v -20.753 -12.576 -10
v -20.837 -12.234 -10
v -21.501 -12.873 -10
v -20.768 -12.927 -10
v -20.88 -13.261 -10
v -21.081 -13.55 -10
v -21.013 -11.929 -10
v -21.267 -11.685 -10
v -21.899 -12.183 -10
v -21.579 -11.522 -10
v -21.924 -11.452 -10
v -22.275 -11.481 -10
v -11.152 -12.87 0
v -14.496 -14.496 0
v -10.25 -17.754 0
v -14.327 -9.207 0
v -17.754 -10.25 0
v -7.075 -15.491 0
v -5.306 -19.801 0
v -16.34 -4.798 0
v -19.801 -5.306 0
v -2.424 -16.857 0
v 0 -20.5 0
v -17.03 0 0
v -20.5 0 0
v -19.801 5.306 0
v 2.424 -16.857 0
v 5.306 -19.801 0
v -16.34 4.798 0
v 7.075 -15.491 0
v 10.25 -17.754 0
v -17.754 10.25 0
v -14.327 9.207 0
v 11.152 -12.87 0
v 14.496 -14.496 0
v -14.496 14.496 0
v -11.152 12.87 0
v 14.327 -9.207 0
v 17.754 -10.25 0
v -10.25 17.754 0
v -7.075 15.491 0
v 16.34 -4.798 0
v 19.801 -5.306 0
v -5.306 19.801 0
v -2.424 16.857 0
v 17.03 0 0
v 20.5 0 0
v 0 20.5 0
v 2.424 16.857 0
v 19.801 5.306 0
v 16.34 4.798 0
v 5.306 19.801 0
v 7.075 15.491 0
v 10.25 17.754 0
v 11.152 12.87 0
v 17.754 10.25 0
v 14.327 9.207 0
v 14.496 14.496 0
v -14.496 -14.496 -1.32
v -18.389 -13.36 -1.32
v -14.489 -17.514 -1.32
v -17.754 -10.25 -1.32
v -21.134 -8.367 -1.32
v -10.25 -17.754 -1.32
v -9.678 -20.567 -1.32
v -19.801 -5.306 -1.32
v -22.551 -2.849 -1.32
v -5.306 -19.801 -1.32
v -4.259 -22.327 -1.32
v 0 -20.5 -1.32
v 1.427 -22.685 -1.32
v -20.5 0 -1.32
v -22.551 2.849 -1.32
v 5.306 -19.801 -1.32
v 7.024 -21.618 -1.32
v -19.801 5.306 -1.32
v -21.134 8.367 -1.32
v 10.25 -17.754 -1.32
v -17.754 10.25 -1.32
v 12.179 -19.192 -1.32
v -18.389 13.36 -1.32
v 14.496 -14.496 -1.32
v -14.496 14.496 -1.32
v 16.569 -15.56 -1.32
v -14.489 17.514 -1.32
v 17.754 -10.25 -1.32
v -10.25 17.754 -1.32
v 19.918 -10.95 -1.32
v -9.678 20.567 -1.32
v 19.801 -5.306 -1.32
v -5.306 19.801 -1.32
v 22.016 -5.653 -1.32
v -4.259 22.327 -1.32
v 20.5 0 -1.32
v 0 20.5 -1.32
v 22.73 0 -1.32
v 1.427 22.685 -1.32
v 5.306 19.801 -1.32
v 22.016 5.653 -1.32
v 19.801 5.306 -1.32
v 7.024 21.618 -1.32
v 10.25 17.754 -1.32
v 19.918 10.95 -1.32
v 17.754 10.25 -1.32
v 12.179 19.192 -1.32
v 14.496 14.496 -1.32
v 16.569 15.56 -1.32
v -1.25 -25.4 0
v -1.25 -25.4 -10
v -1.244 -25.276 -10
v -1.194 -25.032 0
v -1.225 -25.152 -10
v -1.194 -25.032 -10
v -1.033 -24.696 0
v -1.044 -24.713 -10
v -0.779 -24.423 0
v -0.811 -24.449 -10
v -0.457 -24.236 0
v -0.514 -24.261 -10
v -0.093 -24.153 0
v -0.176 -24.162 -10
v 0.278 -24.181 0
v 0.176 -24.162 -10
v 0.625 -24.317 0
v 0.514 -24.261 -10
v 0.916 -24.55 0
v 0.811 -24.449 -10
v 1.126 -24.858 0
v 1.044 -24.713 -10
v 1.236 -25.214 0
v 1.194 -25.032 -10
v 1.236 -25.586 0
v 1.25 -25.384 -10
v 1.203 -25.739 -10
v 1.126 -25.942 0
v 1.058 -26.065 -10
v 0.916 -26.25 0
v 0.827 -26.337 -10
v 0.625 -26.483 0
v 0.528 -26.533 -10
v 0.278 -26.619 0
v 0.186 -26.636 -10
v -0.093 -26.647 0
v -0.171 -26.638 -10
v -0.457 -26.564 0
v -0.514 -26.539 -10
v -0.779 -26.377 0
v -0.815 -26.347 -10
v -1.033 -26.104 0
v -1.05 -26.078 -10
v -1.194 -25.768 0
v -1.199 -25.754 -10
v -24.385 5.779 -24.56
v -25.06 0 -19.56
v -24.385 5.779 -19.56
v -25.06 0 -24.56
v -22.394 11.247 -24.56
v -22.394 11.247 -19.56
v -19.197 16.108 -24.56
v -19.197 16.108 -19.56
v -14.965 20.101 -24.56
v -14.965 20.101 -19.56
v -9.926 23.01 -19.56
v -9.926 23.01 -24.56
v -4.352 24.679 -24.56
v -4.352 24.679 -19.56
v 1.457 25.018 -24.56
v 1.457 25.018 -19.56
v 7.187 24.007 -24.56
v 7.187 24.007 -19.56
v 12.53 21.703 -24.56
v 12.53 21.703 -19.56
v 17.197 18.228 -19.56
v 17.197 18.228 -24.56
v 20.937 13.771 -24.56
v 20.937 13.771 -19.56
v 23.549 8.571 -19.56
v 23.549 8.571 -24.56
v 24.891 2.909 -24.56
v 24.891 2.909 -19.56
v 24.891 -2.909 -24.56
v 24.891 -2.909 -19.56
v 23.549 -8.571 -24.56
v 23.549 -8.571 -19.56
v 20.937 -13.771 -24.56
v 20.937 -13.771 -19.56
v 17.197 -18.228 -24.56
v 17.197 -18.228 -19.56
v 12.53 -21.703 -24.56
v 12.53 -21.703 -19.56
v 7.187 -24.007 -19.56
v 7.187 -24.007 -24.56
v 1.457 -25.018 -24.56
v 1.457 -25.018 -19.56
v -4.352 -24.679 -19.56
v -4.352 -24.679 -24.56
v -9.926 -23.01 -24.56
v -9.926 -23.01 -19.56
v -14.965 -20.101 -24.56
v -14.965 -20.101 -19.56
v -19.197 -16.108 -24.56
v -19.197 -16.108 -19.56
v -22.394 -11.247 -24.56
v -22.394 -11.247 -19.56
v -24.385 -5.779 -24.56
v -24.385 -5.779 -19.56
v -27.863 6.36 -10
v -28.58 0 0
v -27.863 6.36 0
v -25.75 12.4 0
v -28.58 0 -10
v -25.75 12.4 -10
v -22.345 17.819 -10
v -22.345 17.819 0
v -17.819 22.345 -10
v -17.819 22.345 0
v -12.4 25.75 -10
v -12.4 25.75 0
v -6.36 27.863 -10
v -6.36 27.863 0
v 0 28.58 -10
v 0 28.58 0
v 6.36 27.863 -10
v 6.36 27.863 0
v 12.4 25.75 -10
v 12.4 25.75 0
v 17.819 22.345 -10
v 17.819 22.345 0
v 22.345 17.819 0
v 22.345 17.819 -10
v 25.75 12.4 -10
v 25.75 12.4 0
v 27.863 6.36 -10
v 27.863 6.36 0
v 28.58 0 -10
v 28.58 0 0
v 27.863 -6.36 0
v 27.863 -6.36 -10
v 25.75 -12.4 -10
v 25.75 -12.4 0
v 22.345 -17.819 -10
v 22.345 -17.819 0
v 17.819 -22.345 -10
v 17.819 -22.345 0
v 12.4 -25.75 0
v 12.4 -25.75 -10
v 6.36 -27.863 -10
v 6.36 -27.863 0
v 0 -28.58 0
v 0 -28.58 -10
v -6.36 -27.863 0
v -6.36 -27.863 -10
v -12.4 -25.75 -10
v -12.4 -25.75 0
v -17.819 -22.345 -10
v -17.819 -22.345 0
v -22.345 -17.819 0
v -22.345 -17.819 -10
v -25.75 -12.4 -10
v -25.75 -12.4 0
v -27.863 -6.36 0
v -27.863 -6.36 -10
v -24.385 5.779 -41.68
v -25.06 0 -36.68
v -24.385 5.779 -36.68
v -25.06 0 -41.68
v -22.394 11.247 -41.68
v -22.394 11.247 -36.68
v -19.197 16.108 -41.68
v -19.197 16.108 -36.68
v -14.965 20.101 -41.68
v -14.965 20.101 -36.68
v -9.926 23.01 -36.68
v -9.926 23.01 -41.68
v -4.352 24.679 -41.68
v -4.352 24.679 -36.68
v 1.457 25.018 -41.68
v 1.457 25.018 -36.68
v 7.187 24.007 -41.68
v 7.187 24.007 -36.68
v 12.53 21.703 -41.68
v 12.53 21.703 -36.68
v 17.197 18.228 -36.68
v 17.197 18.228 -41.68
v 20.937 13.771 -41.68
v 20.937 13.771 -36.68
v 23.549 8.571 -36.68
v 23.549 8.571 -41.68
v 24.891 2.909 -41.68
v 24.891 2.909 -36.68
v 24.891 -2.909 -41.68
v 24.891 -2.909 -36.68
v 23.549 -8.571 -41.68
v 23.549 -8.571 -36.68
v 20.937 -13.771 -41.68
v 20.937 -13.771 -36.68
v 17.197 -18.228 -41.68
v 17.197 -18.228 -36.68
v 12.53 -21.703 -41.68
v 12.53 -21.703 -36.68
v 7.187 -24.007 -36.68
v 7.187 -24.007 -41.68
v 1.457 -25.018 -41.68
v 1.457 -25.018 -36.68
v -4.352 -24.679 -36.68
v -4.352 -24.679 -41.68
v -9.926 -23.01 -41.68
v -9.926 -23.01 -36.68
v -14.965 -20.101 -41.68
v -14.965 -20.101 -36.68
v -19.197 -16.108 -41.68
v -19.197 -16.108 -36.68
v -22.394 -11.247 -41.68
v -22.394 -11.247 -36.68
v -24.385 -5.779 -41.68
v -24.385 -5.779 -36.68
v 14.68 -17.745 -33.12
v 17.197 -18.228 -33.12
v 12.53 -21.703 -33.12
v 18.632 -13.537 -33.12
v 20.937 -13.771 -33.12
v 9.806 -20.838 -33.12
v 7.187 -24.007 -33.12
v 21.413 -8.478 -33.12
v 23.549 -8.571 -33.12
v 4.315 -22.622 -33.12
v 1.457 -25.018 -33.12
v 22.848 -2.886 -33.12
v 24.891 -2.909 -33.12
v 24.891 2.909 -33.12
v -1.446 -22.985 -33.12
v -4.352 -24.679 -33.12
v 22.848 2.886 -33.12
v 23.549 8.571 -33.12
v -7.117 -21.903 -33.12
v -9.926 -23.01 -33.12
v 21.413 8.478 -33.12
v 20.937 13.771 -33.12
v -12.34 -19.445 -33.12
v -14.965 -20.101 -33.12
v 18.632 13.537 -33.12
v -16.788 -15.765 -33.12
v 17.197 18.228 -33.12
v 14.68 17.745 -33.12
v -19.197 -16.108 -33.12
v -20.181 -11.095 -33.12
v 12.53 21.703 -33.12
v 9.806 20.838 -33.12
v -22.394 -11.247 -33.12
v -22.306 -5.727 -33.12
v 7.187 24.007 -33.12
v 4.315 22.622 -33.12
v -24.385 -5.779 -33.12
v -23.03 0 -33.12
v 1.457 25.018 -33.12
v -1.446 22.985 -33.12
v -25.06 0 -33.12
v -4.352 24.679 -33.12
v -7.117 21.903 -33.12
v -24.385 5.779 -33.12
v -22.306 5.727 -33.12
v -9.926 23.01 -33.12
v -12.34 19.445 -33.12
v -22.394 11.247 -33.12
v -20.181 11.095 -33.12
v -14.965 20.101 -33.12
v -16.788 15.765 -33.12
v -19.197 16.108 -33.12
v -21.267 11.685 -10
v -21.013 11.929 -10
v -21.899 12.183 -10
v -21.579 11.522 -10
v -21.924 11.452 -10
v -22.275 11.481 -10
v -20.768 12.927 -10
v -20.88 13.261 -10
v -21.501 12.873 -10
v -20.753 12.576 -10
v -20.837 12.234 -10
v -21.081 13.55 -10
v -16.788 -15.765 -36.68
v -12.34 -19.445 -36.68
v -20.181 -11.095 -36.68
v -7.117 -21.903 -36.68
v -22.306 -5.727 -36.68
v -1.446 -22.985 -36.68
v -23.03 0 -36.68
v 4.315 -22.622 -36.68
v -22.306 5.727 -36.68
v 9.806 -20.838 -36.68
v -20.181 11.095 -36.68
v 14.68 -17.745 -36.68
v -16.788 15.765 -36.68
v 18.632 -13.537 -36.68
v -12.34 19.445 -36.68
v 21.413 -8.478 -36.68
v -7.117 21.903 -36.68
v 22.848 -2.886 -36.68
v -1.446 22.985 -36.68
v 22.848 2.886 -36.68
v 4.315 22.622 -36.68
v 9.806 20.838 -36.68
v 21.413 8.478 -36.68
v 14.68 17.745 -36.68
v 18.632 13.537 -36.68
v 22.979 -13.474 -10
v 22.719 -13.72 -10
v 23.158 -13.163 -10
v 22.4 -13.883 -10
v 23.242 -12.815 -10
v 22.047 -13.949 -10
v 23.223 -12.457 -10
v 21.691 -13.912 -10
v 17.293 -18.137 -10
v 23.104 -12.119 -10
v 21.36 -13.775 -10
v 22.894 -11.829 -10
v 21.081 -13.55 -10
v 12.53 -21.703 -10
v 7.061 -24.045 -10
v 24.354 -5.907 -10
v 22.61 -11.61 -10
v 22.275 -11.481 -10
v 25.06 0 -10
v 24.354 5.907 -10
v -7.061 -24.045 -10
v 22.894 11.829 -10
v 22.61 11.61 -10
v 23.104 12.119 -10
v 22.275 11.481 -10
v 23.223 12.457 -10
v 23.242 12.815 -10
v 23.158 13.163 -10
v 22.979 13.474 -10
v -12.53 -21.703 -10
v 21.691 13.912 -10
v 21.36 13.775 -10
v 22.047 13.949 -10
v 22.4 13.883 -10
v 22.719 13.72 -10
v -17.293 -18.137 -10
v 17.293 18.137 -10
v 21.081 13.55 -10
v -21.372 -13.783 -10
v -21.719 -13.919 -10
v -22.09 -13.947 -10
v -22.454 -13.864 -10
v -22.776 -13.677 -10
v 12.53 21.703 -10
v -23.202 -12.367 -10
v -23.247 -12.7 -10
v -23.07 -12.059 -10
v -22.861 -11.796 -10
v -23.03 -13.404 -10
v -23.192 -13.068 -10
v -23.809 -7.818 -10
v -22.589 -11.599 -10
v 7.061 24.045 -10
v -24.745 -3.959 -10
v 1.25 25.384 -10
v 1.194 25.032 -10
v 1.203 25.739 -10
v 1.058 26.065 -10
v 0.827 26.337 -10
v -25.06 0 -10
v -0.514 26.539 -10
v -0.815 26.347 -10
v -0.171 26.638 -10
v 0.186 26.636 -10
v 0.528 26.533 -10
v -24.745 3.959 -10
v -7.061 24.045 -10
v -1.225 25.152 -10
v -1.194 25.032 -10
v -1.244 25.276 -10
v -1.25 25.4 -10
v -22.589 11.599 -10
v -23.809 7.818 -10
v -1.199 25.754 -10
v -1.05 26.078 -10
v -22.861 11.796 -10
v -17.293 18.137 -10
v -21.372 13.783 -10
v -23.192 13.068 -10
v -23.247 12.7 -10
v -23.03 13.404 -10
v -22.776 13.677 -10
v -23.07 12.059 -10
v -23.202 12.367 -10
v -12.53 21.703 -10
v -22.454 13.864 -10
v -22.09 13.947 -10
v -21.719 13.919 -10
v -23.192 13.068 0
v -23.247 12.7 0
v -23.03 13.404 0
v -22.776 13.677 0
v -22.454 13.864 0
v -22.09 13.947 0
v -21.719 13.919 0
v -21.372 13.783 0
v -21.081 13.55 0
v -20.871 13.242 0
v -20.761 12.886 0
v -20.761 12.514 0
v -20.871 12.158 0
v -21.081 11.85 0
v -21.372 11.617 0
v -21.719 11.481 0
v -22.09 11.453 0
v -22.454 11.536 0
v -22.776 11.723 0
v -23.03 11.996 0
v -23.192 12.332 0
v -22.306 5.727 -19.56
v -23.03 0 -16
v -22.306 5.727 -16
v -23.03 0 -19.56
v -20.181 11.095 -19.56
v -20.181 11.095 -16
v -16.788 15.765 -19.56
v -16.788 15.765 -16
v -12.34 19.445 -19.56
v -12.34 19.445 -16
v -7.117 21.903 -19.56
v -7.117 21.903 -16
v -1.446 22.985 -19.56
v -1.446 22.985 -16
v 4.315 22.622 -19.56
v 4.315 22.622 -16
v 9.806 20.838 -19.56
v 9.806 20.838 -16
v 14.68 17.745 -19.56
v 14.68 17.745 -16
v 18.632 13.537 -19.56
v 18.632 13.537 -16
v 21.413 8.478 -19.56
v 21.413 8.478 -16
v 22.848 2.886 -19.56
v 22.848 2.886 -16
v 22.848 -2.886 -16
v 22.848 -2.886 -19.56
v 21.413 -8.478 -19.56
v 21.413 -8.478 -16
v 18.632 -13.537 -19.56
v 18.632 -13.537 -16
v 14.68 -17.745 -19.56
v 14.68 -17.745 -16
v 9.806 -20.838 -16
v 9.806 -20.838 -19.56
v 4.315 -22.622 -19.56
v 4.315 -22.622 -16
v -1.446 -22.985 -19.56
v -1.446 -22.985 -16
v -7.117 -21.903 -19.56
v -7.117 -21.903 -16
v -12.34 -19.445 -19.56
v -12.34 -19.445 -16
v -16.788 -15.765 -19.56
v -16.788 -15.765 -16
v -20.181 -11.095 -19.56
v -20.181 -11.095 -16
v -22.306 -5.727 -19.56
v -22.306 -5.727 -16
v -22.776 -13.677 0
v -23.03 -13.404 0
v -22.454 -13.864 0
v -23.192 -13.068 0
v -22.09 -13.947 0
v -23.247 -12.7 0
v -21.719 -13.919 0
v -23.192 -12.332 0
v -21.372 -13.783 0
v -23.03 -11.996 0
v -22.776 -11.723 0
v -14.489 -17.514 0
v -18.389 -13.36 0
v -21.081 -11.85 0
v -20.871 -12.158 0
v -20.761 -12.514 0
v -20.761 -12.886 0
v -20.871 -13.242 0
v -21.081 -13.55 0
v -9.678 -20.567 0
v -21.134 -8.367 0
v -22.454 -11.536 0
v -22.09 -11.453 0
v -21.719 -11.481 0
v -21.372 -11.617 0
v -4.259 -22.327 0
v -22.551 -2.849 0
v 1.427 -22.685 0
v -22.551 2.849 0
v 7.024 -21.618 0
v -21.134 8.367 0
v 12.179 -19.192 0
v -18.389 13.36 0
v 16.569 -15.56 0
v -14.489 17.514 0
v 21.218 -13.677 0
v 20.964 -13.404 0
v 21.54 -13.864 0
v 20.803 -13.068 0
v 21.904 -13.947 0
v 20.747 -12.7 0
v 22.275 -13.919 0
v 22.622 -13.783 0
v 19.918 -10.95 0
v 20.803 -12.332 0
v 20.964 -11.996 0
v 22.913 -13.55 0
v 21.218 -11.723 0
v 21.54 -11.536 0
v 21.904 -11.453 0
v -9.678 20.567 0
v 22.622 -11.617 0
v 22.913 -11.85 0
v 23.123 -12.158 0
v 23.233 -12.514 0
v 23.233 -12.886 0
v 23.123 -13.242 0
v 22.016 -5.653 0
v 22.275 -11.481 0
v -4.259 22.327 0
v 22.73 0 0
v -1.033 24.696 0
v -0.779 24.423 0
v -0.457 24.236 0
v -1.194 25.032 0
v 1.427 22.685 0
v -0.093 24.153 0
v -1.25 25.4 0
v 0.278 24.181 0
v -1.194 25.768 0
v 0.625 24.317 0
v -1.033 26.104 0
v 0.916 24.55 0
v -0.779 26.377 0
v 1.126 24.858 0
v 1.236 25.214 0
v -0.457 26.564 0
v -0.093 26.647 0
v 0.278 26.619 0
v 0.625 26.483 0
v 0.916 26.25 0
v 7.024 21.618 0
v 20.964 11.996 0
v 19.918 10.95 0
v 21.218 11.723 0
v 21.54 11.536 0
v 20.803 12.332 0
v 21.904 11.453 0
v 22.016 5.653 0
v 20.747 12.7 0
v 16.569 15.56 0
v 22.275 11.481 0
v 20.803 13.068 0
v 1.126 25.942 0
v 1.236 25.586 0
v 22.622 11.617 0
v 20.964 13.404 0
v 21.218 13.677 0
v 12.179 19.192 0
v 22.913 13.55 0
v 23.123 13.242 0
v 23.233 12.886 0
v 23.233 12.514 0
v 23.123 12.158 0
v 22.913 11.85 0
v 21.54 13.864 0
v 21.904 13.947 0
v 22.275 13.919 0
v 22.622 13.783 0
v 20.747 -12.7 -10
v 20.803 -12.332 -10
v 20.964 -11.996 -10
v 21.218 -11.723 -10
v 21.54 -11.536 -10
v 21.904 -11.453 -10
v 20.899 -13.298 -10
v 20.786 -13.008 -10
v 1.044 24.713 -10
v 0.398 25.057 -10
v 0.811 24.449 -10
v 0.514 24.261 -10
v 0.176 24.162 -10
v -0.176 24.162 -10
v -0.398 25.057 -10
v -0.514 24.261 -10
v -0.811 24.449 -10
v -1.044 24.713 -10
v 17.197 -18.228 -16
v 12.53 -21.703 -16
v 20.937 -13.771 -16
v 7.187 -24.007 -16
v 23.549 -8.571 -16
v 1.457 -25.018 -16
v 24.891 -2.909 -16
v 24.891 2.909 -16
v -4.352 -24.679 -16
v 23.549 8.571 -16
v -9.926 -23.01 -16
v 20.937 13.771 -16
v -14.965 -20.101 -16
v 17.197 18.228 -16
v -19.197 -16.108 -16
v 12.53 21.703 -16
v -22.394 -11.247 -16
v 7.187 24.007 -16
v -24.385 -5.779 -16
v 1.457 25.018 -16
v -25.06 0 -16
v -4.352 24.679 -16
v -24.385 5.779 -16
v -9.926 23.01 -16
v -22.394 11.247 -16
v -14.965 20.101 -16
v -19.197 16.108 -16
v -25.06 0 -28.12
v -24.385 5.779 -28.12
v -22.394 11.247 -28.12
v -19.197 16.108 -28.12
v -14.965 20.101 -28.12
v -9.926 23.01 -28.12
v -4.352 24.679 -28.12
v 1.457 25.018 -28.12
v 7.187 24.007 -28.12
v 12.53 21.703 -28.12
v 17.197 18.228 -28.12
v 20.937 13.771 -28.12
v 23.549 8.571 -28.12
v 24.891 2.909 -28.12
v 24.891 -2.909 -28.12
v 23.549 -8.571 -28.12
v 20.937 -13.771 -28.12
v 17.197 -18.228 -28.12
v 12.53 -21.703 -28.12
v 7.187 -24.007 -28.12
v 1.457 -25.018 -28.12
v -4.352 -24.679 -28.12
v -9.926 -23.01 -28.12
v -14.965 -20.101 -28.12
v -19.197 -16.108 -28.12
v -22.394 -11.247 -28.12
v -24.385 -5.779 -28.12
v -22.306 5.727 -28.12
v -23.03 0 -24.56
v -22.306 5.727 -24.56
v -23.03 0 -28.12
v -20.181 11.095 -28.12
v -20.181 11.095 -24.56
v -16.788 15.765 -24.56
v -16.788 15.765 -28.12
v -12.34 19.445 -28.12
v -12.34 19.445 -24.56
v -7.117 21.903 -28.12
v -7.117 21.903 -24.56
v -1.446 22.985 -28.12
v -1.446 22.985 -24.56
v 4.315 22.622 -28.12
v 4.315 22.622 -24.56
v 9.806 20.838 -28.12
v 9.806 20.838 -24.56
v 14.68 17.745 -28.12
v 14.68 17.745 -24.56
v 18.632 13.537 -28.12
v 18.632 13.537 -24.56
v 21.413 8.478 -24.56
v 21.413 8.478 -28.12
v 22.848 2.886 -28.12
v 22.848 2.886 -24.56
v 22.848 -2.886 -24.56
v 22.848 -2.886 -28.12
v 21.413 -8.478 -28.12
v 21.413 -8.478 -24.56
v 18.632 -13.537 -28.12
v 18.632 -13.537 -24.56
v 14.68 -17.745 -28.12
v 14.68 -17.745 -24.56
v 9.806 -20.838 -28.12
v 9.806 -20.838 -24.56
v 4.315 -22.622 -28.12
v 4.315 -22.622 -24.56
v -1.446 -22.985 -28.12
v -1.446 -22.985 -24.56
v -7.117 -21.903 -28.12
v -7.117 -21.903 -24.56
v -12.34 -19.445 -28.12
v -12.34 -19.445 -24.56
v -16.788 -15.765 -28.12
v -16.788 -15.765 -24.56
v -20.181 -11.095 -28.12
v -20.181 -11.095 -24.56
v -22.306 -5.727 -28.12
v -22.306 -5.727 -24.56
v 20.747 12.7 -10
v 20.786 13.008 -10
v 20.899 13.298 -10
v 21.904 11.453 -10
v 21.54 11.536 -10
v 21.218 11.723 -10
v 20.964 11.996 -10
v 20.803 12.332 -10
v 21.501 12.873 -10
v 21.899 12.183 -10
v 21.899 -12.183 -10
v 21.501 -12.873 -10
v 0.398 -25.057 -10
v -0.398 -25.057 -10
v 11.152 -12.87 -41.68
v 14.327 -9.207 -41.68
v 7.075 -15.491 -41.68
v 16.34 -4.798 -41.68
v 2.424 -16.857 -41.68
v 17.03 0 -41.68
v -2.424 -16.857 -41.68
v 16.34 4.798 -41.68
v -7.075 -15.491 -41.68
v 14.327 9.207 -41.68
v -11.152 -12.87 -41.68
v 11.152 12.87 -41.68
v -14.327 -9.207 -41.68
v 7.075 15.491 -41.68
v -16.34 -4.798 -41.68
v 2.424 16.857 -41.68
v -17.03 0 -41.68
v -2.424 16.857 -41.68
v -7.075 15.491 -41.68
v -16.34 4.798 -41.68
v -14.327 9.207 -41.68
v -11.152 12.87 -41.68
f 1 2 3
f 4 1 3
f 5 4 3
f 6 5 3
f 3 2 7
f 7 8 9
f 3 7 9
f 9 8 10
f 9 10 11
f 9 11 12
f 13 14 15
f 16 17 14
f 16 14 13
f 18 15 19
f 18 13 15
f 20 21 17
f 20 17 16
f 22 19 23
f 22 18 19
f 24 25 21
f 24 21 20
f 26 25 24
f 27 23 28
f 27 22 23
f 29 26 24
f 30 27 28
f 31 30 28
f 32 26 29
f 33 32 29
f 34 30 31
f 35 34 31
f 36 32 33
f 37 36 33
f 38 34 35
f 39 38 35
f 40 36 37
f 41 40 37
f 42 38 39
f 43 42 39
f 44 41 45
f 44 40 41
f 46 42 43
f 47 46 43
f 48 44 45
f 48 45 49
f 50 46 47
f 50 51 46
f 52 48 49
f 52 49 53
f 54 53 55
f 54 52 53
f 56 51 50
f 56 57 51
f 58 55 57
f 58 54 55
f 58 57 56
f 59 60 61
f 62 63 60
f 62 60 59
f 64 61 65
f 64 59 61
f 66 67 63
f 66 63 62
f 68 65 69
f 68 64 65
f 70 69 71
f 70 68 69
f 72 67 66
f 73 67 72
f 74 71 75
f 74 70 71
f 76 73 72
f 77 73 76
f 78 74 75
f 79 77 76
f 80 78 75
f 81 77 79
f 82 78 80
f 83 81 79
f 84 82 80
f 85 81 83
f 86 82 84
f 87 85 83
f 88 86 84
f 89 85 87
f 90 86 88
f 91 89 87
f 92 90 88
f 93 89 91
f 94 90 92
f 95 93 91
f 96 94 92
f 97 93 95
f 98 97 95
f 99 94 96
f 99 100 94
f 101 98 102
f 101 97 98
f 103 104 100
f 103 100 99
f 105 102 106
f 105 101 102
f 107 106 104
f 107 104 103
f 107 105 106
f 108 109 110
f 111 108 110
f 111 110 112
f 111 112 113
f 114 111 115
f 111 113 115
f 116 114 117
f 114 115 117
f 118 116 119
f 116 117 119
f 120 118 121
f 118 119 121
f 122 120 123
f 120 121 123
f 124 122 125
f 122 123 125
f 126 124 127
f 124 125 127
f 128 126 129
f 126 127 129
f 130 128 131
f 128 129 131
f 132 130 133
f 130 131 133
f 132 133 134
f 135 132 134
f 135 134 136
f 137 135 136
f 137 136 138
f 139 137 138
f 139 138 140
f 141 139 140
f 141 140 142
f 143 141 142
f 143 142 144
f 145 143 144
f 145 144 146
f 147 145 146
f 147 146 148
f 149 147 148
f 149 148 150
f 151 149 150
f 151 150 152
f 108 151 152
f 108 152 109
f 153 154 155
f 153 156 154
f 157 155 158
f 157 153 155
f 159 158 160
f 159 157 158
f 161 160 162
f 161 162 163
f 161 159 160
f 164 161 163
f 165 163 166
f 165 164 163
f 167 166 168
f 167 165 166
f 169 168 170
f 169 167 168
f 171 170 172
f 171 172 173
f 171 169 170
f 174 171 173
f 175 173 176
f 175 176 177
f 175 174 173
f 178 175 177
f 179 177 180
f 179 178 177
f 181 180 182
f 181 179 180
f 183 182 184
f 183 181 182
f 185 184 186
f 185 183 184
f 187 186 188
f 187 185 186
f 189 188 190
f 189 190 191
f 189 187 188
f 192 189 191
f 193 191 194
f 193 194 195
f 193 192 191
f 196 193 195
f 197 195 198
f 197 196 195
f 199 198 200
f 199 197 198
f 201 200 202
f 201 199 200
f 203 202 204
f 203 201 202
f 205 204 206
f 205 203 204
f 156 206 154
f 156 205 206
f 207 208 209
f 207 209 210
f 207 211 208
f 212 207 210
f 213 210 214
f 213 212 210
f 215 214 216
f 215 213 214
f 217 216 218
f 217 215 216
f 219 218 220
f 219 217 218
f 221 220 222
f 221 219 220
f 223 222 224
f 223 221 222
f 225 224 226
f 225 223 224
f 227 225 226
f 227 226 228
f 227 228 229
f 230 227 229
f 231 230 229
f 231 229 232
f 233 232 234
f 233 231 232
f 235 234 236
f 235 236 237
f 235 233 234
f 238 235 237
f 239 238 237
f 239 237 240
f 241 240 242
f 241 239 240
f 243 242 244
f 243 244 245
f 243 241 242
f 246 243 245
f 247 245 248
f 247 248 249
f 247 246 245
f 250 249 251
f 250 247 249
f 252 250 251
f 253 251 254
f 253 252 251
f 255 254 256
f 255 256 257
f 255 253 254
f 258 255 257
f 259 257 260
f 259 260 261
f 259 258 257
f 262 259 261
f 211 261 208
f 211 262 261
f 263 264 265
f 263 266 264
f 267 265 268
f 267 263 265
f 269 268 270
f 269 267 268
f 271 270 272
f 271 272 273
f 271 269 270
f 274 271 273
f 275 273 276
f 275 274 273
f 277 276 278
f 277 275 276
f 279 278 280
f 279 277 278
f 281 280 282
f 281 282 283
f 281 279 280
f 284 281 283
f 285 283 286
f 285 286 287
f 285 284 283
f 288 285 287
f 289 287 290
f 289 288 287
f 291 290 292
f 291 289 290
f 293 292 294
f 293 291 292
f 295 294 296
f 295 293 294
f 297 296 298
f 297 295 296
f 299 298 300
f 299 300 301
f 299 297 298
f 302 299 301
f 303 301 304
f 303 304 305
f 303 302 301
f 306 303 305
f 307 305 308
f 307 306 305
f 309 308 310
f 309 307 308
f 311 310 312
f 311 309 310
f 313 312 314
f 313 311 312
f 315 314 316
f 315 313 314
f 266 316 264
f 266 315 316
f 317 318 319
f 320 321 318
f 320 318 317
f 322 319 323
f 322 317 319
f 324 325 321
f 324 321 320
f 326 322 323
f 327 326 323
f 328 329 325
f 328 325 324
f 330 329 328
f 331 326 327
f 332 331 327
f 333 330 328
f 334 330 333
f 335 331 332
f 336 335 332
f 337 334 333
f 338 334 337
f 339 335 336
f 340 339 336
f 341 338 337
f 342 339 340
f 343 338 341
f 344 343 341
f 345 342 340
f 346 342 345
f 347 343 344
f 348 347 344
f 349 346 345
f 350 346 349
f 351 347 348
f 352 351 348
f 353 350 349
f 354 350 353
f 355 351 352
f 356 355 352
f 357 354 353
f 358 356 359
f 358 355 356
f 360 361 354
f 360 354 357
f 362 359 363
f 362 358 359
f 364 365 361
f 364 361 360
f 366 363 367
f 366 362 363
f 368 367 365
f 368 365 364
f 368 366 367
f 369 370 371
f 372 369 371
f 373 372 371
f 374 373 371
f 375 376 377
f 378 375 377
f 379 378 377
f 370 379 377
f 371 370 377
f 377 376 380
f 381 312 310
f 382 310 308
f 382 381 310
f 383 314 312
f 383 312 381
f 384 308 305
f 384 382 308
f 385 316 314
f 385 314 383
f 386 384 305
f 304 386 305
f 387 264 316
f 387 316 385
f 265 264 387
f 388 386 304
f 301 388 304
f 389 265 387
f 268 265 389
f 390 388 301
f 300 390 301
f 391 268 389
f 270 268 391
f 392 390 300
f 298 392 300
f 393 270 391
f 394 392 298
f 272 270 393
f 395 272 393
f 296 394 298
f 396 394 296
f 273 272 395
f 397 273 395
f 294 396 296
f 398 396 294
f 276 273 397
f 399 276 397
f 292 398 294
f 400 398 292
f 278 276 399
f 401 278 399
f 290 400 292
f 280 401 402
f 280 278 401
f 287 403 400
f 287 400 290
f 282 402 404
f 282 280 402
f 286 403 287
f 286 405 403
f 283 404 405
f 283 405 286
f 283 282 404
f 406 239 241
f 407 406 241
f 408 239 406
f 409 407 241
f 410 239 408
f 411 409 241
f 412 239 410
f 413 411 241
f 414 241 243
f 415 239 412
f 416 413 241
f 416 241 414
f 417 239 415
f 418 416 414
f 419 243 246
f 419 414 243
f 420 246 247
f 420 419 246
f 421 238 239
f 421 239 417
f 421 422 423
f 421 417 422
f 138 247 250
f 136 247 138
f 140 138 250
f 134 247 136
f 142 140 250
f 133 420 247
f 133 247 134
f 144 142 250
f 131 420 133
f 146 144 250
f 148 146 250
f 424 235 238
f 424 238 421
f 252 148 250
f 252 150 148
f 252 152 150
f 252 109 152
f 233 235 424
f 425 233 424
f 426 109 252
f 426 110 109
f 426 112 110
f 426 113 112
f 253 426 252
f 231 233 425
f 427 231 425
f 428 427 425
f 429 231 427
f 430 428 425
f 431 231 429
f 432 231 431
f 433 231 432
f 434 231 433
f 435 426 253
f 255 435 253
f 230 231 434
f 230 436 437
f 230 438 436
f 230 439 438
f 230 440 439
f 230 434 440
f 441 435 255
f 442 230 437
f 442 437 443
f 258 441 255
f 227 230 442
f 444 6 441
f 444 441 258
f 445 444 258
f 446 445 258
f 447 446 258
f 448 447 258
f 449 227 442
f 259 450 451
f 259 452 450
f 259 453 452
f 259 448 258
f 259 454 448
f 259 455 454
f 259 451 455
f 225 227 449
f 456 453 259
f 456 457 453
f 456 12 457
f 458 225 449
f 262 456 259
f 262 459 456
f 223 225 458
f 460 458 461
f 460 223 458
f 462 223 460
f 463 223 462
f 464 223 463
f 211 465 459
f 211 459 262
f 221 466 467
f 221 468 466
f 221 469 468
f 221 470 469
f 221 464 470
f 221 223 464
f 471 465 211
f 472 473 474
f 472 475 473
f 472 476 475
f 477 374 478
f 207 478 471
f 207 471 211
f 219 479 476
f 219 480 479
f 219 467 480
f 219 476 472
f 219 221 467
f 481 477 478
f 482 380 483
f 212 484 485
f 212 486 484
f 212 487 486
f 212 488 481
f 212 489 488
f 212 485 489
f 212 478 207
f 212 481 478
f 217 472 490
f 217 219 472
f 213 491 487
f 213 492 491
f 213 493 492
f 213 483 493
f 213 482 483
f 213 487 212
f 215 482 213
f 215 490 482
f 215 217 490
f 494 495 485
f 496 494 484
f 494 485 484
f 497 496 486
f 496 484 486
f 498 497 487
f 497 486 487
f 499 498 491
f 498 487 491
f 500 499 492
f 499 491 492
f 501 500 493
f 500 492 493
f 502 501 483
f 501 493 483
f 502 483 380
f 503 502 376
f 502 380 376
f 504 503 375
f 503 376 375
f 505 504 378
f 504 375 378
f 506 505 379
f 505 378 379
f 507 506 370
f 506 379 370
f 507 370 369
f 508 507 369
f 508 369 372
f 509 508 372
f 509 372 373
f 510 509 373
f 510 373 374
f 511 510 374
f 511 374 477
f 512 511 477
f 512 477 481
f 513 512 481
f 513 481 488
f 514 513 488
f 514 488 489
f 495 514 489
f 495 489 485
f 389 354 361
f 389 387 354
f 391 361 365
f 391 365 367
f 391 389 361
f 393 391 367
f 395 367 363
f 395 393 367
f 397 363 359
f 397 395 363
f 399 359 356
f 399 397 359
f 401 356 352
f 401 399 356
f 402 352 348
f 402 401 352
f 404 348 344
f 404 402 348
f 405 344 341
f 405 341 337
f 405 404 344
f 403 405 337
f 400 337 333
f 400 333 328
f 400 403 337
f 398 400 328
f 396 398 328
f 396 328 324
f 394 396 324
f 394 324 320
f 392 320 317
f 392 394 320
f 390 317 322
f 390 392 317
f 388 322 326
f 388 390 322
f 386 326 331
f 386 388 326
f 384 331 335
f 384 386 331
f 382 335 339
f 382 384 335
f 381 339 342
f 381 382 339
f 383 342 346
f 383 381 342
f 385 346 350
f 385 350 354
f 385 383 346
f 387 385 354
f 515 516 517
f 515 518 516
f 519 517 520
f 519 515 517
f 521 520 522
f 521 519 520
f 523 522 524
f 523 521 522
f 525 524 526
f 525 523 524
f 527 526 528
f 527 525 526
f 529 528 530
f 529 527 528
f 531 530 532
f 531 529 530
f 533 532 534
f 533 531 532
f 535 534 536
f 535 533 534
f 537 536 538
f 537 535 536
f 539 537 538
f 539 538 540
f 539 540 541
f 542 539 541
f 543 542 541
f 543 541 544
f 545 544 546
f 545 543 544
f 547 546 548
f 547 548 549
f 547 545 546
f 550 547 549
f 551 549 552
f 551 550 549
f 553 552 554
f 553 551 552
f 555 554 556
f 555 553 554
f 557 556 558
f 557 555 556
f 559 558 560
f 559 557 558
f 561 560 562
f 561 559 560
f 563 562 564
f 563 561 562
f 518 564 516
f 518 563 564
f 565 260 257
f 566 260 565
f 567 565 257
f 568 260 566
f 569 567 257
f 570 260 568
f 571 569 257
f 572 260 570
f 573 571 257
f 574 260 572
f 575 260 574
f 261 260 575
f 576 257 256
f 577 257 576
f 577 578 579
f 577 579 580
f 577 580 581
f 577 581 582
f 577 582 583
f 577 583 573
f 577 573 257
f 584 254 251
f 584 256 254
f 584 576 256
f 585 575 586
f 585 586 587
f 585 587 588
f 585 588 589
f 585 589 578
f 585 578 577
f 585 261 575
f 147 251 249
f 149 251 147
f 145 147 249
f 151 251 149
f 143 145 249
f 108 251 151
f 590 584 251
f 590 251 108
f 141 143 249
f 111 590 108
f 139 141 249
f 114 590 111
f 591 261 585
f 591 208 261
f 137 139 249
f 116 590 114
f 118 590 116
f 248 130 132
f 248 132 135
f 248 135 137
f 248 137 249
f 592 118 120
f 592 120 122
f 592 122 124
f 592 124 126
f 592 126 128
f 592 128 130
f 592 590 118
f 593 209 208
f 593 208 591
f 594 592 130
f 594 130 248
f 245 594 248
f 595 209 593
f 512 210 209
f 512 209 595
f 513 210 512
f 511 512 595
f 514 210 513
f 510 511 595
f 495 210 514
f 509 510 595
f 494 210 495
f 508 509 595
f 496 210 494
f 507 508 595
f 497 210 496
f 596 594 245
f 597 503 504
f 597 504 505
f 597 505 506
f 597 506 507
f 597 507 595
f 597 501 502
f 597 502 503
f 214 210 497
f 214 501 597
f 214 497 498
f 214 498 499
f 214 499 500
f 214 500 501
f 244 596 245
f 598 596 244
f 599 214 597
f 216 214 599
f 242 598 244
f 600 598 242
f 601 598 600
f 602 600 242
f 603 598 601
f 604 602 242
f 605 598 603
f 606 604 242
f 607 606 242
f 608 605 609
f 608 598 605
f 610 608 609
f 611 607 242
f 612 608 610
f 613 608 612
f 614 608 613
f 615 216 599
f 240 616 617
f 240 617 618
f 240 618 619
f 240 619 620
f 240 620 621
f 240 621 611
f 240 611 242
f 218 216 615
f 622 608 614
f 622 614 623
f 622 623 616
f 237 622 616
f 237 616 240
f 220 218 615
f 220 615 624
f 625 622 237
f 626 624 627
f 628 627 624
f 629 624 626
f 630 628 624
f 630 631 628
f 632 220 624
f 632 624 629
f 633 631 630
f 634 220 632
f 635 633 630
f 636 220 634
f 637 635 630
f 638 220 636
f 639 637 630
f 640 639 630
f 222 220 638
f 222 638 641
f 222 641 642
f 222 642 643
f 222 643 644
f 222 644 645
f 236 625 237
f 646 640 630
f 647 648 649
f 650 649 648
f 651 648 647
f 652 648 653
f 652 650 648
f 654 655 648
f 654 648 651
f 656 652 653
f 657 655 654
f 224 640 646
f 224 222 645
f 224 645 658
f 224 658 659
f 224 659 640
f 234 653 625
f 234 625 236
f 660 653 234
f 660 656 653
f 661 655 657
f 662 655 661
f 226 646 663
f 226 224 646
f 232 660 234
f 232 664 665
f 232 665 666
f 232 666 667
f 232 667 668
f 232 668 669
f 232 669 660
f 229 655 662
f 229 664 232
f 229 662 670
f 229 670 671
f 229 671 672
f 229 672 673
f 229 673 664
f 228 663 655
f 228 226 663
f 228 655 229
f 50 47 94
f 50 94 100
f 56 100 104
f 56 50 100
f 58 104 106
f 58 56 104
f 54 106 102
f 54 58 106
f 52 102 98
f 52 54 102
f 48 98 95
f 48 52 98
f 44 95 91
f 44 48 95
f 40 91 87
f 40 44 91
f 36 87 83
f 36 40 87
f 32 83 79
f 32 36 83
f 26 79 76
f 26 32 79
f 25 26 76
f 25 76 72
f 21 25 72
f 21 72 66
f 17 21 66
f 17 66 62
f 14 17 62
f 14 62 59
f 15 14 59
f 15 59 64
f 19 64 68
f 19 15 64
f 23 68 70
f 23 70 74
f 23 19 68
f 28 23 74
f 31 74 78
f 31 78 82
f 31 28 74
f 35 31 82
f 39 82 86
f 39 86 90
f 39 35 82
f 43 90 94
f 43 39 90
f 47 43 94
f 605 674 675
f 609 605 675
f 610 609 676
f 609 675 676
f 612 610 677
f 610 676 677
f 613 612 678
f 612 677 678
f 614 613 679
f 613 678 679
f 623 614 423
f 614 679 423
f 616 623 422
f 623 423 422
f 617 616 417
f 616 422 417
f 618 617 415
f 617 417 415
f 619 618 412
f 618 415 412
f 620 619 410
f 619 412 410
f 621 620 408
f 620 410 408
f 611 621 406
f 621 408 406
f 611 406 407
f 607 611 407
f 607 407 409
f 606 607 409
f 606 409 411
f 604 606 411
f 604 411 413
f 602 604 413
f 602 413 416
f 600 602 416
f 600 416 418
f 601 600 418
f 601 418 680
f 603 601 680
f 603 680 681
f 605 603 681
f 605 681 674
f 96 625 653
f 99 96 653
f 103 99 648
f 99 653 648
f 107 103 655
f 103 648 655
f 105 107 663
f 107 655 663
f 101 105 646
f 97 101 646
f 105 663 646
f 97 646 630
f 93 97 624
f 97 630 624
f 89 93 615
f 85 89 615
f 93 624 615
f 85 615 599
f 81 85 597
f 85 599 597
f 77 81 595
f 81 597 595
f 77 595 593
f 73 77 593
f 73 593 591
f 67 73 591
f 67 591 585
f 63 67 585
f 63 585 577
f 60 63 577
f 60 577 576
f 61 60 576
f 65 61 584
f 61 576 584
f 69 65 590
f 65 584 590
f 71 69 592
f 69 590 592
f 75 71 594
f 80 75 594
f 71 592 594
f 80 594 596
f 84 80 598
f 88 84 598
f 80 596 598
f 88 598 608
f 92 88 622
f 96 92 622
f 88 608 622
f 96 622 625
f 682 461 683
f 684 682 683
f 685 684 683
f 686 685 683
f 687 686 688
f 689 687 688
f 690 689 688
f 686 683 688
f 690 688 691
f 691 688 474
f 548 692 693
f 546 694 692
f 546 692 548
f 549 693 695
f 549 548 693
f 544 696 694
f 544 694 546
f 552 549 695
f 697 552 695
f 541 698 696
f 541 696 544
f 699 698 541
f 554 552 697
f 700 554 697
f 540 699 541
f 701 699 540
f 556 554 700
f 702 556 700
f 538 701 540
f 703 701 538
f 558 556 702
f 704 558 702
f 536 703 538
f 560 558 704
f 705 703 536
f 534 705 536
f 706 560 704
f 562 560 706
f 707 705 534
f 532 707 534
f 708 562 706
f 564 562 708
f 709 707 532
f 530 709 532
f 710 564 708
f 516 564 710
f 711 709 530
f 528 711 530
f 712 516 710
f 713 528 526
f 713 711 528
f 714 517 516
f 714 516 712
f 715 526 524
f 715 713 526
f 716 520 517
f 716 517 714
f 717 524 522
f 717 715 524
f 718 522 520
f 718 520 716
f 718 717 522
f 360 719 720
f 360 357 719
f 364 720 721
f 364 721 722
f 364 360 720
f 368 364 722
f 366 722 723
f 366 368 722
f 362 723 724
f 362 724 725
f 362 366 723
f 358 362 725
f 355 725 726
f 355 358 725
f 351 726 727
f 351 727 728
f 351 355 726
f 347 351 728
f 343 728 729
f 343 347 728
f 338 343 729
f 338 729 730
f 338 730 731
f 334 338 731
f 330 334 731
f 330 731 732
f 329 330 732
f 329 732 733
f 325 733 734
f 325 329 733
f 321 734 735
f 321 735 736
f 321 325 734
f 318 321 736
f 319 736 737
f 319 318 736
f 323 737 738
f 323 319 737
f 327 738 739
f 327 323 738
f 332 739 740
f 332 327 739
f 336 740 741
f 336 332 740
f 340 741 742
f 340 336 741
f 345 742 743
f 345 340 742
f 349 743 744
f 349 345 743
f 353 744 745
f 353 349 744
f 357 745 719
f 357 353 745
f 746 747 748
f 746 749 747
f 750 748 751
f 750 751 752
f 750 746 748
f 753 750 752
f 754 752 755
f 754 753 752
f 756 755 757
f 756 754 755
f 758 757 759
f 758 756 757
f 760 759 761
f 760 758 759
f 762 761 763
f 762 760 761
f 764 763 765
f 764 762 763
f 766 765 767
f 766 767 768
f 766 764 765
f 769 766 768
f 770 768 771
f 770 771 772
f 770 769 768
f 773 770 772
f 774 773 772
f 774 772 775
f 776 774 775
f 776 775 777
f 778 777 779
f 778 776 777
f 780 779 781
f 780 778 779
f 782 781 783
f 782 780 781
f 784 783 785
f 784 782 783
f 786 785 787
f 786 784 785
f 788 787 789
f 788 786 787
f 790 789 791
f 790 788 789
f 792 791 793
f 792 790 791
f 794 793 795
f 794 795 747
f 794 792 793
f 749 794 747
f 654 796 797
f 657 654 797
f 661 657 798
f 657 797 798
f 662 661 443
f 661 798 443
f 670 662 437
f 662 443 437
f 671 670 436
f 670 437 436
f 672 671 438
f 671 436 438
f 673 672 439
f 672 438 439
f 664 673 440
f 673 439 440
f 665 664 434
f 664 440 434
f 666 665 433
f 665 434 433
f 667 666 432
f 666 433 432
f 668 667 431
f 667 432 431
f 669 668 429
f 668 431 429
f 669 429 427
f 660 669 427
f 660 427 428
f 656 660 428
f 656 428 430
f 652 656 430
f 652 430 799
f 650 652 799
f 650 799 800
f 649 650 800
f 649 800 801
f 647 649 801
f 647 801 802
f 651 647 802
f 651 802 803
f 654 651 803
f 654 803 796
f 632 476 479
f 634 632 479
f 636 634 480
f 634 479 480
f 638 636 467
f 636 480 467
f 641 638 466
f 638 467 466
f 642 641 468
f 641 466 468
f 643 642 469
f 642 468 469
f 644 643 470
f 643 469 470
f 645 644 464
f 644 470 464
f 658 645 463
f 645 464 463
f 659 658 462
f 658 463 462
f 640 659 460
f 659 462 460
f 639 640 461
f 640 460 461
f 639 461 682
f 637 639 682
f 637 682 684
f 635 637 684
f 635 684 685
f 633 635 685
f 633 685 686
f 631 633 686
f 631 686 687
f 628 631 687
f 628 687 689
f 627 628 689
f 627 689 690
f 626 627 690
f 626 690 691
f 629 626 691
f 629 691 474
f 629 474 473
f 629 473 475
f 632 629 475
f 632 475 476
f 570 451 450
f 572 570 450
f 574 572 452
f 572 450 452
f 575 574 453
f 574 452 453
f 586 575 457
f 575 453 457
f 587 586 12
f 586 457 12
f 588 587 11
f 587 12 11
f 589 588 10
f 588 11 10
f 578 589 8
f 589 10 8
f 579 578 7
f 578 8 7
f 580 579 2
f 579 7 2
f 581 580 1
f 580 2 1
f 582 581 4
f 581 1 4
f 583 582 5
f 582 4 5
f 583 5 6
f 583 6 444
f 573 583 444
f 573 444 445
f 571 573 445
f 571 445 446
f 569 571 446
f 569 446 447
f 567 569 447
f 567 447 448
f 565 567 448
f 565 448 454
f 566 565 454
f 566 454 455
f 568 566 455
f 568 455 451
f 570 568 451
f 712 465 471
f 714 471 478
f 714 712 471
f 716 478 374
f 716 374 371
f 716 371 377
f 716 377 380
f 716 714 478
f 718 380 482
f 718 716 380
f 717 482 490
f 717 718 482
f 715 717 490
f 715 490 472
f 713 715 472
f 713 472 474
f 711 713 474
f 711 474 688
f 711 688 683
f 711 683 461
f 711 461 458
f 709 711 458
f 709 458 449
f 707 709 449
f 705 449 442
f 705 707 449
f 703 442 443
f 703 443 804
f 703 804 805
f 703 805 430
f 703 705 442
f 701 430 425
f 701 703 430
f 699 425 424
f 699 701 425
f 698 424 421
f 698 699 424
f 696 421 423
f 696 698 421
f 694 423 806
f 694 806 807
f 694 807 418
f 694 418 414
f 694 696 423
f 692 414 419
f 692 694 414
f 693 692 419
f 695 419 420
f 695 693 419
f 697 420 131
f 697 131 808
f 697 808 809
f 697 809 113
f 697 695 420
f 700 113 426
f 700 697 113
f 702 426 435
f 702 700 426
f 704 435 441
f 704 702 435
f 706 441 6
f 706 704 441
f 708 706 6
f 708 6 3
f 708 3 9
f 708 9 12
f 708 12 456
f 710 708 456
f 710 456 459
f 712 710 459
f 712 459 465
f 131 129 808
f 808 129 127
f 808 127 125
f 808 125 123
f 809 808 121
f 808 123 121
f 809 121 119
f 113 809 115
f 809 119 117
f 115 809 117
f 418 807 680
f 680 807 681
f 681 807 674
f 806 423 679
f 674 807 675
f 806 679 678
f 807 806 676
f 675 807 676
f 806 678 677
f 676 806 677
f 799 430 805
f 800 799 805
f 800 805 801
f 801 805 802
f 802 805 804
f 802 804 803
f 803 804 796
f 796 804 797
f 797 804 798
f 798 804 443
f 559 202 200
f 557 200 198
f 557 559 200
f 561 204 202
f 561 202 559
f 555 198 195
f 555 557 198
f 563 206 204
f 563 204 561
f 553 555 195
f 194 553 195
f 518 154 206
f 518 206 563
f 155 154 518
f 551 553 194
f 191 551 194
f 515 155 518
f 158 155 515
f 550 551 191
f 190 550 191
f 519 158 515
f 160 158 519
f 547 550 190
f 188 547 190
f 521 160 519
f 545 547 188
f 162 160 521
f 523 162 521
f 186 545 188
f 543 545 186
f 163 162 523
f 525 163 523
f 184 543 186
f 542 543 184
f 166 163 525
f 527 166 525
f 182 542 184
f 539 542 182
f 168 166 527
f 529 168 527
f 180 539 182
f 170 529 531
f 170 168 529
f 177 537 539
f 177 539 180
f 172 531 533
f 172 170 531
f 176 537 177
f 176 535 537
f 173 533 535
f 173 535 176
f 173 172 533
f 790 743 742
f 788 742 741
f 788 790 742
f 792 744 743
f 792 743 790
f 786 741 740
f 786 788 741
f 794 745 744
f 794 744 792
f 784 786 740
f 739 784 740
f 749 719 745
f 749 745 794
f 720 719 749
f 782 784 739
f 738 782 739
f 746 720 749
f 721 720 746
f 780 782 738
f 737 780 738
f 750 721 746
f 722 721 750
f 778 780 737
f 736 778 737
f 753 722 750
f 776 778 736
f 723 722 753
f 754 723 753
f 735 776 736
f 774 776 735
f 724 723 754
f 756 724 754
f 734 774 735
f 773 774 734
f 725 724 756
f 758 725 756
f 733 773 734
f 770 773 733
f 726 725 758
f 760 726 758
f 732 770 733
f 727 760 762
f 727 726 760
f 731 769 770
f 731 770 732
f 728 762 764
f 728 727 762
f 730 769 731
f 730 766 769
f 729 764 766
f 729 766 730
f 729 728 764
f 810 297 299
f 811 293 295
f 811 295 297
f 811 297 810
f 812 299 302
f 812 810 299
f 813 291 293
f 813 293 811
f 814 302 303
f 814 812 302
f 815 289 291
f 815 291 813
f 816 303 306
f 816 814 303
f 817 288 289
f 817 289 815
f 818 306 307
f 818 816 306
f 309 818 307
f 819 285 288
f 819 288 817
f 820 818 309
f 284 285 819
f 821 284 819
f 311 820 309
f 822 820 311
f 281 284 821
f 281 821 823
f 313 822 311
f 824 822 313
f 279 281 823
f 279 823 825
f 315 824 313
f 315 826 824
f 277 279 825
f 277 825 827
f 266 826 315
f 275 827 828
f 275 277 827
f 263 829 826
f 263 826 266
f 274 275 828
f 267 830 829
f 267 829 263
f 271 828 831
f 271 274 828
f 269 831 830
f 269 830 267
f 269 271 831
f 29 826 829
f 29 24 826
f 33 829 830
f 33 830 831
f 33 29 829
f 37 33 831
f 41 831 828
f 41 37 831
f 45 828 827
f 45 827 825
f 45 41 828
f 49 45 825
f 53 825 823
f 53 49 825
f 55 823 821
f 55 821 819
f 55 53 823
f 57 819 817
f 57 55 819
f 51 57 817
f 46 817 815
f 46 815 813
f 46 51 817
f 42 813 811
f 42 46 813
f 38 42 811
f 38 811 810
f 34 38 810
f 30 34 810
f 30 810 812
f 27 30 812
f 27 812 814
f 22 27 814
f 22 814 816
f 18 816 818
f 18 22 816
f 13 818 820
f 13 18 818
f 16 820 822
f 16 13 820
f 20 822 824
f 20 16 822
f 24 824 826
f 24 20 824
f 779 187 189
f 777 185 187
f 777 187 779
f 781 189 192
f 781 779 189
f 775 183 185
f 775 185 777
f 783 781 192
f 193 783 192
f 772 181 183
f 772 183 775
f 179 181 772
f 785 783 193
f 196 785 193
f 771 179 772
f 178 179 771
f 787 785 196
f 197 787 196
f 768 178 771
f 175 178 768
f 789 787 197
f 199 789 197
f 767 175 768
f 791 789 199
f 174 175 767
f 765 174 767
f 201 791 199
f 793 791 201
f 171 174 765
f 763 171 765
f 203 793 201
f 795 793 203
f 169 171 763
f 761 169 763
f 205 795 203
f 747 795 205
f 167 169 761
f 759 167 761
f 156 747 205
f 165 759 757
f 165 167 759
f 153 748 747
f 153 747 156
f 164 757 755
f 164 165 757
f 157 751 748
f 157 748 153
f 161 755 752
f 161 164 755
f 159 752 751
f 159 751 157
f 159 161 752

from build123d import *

# Parameters (mm, degrees)
M3X0_5_TAPPED_HOLE1_D     = 2.5
M3X0_5_TAPPED_HOLE1_DEPTH = 10
SKETCH5_R                 = 22.73
SKETCH5_R_2               = 20.5
CUT_EXTRUDE1_DEPTH        = 1.32


with BuildPart() as part:
    # Sketch1 → Revolve1 (revolve)
    with BuildSketch(Plane(origin=(0, 0, 0), x_dir=(1, 0, 0), z_dir=(0, 1, 0))):
        Polygon((-28.58, 0), (-28.58, 10), (-25.06, 10), (-25.06, 16), (-23.03, 16), (-23.03, 19.56), (-25.06, 19.56), (-25.06, 24.56), (-23.03, 24.56), (-23.03, 28.12), (-25.06, 28.12), (-25.06, 33.12), (-23.03, 33.12), (-23.03, 36.68), (-25.06, 36.68), (-25.06, 41.68), (-17.03, 41.68), (-17.03, 0), align=None)
    revolve(axis=Axis((0, 0, 0), (0, 0, -1)))

    # M3x0.5 Tapped Hole1
    with Locations(Plane.XY):
        with Locations((0, 25.4), (21.997045256, 12.7), (21.997045256, -12.7), (0, -25.4), (-21.997045256, -12.7), (-21.997045256, 12.7)):
            Hole(M3X0_5_TAPPED_HOLE1_D / 2, depth=M3X0_5_TAPPED_HOLE1_DEPTH)

    # Sketch5 → Cut-Extrude1 (cut)
    with BuildSketch(Plane.XY):
        Circle(SKETCH5_R)
        Circle(SKETCH5_R_2, mode=Mode.SUBTRACT)
    extrude(amount=-CUT_EXTRUDE1_DEPTH, mode=Mode.SUBTRACT)


solid = part.part
